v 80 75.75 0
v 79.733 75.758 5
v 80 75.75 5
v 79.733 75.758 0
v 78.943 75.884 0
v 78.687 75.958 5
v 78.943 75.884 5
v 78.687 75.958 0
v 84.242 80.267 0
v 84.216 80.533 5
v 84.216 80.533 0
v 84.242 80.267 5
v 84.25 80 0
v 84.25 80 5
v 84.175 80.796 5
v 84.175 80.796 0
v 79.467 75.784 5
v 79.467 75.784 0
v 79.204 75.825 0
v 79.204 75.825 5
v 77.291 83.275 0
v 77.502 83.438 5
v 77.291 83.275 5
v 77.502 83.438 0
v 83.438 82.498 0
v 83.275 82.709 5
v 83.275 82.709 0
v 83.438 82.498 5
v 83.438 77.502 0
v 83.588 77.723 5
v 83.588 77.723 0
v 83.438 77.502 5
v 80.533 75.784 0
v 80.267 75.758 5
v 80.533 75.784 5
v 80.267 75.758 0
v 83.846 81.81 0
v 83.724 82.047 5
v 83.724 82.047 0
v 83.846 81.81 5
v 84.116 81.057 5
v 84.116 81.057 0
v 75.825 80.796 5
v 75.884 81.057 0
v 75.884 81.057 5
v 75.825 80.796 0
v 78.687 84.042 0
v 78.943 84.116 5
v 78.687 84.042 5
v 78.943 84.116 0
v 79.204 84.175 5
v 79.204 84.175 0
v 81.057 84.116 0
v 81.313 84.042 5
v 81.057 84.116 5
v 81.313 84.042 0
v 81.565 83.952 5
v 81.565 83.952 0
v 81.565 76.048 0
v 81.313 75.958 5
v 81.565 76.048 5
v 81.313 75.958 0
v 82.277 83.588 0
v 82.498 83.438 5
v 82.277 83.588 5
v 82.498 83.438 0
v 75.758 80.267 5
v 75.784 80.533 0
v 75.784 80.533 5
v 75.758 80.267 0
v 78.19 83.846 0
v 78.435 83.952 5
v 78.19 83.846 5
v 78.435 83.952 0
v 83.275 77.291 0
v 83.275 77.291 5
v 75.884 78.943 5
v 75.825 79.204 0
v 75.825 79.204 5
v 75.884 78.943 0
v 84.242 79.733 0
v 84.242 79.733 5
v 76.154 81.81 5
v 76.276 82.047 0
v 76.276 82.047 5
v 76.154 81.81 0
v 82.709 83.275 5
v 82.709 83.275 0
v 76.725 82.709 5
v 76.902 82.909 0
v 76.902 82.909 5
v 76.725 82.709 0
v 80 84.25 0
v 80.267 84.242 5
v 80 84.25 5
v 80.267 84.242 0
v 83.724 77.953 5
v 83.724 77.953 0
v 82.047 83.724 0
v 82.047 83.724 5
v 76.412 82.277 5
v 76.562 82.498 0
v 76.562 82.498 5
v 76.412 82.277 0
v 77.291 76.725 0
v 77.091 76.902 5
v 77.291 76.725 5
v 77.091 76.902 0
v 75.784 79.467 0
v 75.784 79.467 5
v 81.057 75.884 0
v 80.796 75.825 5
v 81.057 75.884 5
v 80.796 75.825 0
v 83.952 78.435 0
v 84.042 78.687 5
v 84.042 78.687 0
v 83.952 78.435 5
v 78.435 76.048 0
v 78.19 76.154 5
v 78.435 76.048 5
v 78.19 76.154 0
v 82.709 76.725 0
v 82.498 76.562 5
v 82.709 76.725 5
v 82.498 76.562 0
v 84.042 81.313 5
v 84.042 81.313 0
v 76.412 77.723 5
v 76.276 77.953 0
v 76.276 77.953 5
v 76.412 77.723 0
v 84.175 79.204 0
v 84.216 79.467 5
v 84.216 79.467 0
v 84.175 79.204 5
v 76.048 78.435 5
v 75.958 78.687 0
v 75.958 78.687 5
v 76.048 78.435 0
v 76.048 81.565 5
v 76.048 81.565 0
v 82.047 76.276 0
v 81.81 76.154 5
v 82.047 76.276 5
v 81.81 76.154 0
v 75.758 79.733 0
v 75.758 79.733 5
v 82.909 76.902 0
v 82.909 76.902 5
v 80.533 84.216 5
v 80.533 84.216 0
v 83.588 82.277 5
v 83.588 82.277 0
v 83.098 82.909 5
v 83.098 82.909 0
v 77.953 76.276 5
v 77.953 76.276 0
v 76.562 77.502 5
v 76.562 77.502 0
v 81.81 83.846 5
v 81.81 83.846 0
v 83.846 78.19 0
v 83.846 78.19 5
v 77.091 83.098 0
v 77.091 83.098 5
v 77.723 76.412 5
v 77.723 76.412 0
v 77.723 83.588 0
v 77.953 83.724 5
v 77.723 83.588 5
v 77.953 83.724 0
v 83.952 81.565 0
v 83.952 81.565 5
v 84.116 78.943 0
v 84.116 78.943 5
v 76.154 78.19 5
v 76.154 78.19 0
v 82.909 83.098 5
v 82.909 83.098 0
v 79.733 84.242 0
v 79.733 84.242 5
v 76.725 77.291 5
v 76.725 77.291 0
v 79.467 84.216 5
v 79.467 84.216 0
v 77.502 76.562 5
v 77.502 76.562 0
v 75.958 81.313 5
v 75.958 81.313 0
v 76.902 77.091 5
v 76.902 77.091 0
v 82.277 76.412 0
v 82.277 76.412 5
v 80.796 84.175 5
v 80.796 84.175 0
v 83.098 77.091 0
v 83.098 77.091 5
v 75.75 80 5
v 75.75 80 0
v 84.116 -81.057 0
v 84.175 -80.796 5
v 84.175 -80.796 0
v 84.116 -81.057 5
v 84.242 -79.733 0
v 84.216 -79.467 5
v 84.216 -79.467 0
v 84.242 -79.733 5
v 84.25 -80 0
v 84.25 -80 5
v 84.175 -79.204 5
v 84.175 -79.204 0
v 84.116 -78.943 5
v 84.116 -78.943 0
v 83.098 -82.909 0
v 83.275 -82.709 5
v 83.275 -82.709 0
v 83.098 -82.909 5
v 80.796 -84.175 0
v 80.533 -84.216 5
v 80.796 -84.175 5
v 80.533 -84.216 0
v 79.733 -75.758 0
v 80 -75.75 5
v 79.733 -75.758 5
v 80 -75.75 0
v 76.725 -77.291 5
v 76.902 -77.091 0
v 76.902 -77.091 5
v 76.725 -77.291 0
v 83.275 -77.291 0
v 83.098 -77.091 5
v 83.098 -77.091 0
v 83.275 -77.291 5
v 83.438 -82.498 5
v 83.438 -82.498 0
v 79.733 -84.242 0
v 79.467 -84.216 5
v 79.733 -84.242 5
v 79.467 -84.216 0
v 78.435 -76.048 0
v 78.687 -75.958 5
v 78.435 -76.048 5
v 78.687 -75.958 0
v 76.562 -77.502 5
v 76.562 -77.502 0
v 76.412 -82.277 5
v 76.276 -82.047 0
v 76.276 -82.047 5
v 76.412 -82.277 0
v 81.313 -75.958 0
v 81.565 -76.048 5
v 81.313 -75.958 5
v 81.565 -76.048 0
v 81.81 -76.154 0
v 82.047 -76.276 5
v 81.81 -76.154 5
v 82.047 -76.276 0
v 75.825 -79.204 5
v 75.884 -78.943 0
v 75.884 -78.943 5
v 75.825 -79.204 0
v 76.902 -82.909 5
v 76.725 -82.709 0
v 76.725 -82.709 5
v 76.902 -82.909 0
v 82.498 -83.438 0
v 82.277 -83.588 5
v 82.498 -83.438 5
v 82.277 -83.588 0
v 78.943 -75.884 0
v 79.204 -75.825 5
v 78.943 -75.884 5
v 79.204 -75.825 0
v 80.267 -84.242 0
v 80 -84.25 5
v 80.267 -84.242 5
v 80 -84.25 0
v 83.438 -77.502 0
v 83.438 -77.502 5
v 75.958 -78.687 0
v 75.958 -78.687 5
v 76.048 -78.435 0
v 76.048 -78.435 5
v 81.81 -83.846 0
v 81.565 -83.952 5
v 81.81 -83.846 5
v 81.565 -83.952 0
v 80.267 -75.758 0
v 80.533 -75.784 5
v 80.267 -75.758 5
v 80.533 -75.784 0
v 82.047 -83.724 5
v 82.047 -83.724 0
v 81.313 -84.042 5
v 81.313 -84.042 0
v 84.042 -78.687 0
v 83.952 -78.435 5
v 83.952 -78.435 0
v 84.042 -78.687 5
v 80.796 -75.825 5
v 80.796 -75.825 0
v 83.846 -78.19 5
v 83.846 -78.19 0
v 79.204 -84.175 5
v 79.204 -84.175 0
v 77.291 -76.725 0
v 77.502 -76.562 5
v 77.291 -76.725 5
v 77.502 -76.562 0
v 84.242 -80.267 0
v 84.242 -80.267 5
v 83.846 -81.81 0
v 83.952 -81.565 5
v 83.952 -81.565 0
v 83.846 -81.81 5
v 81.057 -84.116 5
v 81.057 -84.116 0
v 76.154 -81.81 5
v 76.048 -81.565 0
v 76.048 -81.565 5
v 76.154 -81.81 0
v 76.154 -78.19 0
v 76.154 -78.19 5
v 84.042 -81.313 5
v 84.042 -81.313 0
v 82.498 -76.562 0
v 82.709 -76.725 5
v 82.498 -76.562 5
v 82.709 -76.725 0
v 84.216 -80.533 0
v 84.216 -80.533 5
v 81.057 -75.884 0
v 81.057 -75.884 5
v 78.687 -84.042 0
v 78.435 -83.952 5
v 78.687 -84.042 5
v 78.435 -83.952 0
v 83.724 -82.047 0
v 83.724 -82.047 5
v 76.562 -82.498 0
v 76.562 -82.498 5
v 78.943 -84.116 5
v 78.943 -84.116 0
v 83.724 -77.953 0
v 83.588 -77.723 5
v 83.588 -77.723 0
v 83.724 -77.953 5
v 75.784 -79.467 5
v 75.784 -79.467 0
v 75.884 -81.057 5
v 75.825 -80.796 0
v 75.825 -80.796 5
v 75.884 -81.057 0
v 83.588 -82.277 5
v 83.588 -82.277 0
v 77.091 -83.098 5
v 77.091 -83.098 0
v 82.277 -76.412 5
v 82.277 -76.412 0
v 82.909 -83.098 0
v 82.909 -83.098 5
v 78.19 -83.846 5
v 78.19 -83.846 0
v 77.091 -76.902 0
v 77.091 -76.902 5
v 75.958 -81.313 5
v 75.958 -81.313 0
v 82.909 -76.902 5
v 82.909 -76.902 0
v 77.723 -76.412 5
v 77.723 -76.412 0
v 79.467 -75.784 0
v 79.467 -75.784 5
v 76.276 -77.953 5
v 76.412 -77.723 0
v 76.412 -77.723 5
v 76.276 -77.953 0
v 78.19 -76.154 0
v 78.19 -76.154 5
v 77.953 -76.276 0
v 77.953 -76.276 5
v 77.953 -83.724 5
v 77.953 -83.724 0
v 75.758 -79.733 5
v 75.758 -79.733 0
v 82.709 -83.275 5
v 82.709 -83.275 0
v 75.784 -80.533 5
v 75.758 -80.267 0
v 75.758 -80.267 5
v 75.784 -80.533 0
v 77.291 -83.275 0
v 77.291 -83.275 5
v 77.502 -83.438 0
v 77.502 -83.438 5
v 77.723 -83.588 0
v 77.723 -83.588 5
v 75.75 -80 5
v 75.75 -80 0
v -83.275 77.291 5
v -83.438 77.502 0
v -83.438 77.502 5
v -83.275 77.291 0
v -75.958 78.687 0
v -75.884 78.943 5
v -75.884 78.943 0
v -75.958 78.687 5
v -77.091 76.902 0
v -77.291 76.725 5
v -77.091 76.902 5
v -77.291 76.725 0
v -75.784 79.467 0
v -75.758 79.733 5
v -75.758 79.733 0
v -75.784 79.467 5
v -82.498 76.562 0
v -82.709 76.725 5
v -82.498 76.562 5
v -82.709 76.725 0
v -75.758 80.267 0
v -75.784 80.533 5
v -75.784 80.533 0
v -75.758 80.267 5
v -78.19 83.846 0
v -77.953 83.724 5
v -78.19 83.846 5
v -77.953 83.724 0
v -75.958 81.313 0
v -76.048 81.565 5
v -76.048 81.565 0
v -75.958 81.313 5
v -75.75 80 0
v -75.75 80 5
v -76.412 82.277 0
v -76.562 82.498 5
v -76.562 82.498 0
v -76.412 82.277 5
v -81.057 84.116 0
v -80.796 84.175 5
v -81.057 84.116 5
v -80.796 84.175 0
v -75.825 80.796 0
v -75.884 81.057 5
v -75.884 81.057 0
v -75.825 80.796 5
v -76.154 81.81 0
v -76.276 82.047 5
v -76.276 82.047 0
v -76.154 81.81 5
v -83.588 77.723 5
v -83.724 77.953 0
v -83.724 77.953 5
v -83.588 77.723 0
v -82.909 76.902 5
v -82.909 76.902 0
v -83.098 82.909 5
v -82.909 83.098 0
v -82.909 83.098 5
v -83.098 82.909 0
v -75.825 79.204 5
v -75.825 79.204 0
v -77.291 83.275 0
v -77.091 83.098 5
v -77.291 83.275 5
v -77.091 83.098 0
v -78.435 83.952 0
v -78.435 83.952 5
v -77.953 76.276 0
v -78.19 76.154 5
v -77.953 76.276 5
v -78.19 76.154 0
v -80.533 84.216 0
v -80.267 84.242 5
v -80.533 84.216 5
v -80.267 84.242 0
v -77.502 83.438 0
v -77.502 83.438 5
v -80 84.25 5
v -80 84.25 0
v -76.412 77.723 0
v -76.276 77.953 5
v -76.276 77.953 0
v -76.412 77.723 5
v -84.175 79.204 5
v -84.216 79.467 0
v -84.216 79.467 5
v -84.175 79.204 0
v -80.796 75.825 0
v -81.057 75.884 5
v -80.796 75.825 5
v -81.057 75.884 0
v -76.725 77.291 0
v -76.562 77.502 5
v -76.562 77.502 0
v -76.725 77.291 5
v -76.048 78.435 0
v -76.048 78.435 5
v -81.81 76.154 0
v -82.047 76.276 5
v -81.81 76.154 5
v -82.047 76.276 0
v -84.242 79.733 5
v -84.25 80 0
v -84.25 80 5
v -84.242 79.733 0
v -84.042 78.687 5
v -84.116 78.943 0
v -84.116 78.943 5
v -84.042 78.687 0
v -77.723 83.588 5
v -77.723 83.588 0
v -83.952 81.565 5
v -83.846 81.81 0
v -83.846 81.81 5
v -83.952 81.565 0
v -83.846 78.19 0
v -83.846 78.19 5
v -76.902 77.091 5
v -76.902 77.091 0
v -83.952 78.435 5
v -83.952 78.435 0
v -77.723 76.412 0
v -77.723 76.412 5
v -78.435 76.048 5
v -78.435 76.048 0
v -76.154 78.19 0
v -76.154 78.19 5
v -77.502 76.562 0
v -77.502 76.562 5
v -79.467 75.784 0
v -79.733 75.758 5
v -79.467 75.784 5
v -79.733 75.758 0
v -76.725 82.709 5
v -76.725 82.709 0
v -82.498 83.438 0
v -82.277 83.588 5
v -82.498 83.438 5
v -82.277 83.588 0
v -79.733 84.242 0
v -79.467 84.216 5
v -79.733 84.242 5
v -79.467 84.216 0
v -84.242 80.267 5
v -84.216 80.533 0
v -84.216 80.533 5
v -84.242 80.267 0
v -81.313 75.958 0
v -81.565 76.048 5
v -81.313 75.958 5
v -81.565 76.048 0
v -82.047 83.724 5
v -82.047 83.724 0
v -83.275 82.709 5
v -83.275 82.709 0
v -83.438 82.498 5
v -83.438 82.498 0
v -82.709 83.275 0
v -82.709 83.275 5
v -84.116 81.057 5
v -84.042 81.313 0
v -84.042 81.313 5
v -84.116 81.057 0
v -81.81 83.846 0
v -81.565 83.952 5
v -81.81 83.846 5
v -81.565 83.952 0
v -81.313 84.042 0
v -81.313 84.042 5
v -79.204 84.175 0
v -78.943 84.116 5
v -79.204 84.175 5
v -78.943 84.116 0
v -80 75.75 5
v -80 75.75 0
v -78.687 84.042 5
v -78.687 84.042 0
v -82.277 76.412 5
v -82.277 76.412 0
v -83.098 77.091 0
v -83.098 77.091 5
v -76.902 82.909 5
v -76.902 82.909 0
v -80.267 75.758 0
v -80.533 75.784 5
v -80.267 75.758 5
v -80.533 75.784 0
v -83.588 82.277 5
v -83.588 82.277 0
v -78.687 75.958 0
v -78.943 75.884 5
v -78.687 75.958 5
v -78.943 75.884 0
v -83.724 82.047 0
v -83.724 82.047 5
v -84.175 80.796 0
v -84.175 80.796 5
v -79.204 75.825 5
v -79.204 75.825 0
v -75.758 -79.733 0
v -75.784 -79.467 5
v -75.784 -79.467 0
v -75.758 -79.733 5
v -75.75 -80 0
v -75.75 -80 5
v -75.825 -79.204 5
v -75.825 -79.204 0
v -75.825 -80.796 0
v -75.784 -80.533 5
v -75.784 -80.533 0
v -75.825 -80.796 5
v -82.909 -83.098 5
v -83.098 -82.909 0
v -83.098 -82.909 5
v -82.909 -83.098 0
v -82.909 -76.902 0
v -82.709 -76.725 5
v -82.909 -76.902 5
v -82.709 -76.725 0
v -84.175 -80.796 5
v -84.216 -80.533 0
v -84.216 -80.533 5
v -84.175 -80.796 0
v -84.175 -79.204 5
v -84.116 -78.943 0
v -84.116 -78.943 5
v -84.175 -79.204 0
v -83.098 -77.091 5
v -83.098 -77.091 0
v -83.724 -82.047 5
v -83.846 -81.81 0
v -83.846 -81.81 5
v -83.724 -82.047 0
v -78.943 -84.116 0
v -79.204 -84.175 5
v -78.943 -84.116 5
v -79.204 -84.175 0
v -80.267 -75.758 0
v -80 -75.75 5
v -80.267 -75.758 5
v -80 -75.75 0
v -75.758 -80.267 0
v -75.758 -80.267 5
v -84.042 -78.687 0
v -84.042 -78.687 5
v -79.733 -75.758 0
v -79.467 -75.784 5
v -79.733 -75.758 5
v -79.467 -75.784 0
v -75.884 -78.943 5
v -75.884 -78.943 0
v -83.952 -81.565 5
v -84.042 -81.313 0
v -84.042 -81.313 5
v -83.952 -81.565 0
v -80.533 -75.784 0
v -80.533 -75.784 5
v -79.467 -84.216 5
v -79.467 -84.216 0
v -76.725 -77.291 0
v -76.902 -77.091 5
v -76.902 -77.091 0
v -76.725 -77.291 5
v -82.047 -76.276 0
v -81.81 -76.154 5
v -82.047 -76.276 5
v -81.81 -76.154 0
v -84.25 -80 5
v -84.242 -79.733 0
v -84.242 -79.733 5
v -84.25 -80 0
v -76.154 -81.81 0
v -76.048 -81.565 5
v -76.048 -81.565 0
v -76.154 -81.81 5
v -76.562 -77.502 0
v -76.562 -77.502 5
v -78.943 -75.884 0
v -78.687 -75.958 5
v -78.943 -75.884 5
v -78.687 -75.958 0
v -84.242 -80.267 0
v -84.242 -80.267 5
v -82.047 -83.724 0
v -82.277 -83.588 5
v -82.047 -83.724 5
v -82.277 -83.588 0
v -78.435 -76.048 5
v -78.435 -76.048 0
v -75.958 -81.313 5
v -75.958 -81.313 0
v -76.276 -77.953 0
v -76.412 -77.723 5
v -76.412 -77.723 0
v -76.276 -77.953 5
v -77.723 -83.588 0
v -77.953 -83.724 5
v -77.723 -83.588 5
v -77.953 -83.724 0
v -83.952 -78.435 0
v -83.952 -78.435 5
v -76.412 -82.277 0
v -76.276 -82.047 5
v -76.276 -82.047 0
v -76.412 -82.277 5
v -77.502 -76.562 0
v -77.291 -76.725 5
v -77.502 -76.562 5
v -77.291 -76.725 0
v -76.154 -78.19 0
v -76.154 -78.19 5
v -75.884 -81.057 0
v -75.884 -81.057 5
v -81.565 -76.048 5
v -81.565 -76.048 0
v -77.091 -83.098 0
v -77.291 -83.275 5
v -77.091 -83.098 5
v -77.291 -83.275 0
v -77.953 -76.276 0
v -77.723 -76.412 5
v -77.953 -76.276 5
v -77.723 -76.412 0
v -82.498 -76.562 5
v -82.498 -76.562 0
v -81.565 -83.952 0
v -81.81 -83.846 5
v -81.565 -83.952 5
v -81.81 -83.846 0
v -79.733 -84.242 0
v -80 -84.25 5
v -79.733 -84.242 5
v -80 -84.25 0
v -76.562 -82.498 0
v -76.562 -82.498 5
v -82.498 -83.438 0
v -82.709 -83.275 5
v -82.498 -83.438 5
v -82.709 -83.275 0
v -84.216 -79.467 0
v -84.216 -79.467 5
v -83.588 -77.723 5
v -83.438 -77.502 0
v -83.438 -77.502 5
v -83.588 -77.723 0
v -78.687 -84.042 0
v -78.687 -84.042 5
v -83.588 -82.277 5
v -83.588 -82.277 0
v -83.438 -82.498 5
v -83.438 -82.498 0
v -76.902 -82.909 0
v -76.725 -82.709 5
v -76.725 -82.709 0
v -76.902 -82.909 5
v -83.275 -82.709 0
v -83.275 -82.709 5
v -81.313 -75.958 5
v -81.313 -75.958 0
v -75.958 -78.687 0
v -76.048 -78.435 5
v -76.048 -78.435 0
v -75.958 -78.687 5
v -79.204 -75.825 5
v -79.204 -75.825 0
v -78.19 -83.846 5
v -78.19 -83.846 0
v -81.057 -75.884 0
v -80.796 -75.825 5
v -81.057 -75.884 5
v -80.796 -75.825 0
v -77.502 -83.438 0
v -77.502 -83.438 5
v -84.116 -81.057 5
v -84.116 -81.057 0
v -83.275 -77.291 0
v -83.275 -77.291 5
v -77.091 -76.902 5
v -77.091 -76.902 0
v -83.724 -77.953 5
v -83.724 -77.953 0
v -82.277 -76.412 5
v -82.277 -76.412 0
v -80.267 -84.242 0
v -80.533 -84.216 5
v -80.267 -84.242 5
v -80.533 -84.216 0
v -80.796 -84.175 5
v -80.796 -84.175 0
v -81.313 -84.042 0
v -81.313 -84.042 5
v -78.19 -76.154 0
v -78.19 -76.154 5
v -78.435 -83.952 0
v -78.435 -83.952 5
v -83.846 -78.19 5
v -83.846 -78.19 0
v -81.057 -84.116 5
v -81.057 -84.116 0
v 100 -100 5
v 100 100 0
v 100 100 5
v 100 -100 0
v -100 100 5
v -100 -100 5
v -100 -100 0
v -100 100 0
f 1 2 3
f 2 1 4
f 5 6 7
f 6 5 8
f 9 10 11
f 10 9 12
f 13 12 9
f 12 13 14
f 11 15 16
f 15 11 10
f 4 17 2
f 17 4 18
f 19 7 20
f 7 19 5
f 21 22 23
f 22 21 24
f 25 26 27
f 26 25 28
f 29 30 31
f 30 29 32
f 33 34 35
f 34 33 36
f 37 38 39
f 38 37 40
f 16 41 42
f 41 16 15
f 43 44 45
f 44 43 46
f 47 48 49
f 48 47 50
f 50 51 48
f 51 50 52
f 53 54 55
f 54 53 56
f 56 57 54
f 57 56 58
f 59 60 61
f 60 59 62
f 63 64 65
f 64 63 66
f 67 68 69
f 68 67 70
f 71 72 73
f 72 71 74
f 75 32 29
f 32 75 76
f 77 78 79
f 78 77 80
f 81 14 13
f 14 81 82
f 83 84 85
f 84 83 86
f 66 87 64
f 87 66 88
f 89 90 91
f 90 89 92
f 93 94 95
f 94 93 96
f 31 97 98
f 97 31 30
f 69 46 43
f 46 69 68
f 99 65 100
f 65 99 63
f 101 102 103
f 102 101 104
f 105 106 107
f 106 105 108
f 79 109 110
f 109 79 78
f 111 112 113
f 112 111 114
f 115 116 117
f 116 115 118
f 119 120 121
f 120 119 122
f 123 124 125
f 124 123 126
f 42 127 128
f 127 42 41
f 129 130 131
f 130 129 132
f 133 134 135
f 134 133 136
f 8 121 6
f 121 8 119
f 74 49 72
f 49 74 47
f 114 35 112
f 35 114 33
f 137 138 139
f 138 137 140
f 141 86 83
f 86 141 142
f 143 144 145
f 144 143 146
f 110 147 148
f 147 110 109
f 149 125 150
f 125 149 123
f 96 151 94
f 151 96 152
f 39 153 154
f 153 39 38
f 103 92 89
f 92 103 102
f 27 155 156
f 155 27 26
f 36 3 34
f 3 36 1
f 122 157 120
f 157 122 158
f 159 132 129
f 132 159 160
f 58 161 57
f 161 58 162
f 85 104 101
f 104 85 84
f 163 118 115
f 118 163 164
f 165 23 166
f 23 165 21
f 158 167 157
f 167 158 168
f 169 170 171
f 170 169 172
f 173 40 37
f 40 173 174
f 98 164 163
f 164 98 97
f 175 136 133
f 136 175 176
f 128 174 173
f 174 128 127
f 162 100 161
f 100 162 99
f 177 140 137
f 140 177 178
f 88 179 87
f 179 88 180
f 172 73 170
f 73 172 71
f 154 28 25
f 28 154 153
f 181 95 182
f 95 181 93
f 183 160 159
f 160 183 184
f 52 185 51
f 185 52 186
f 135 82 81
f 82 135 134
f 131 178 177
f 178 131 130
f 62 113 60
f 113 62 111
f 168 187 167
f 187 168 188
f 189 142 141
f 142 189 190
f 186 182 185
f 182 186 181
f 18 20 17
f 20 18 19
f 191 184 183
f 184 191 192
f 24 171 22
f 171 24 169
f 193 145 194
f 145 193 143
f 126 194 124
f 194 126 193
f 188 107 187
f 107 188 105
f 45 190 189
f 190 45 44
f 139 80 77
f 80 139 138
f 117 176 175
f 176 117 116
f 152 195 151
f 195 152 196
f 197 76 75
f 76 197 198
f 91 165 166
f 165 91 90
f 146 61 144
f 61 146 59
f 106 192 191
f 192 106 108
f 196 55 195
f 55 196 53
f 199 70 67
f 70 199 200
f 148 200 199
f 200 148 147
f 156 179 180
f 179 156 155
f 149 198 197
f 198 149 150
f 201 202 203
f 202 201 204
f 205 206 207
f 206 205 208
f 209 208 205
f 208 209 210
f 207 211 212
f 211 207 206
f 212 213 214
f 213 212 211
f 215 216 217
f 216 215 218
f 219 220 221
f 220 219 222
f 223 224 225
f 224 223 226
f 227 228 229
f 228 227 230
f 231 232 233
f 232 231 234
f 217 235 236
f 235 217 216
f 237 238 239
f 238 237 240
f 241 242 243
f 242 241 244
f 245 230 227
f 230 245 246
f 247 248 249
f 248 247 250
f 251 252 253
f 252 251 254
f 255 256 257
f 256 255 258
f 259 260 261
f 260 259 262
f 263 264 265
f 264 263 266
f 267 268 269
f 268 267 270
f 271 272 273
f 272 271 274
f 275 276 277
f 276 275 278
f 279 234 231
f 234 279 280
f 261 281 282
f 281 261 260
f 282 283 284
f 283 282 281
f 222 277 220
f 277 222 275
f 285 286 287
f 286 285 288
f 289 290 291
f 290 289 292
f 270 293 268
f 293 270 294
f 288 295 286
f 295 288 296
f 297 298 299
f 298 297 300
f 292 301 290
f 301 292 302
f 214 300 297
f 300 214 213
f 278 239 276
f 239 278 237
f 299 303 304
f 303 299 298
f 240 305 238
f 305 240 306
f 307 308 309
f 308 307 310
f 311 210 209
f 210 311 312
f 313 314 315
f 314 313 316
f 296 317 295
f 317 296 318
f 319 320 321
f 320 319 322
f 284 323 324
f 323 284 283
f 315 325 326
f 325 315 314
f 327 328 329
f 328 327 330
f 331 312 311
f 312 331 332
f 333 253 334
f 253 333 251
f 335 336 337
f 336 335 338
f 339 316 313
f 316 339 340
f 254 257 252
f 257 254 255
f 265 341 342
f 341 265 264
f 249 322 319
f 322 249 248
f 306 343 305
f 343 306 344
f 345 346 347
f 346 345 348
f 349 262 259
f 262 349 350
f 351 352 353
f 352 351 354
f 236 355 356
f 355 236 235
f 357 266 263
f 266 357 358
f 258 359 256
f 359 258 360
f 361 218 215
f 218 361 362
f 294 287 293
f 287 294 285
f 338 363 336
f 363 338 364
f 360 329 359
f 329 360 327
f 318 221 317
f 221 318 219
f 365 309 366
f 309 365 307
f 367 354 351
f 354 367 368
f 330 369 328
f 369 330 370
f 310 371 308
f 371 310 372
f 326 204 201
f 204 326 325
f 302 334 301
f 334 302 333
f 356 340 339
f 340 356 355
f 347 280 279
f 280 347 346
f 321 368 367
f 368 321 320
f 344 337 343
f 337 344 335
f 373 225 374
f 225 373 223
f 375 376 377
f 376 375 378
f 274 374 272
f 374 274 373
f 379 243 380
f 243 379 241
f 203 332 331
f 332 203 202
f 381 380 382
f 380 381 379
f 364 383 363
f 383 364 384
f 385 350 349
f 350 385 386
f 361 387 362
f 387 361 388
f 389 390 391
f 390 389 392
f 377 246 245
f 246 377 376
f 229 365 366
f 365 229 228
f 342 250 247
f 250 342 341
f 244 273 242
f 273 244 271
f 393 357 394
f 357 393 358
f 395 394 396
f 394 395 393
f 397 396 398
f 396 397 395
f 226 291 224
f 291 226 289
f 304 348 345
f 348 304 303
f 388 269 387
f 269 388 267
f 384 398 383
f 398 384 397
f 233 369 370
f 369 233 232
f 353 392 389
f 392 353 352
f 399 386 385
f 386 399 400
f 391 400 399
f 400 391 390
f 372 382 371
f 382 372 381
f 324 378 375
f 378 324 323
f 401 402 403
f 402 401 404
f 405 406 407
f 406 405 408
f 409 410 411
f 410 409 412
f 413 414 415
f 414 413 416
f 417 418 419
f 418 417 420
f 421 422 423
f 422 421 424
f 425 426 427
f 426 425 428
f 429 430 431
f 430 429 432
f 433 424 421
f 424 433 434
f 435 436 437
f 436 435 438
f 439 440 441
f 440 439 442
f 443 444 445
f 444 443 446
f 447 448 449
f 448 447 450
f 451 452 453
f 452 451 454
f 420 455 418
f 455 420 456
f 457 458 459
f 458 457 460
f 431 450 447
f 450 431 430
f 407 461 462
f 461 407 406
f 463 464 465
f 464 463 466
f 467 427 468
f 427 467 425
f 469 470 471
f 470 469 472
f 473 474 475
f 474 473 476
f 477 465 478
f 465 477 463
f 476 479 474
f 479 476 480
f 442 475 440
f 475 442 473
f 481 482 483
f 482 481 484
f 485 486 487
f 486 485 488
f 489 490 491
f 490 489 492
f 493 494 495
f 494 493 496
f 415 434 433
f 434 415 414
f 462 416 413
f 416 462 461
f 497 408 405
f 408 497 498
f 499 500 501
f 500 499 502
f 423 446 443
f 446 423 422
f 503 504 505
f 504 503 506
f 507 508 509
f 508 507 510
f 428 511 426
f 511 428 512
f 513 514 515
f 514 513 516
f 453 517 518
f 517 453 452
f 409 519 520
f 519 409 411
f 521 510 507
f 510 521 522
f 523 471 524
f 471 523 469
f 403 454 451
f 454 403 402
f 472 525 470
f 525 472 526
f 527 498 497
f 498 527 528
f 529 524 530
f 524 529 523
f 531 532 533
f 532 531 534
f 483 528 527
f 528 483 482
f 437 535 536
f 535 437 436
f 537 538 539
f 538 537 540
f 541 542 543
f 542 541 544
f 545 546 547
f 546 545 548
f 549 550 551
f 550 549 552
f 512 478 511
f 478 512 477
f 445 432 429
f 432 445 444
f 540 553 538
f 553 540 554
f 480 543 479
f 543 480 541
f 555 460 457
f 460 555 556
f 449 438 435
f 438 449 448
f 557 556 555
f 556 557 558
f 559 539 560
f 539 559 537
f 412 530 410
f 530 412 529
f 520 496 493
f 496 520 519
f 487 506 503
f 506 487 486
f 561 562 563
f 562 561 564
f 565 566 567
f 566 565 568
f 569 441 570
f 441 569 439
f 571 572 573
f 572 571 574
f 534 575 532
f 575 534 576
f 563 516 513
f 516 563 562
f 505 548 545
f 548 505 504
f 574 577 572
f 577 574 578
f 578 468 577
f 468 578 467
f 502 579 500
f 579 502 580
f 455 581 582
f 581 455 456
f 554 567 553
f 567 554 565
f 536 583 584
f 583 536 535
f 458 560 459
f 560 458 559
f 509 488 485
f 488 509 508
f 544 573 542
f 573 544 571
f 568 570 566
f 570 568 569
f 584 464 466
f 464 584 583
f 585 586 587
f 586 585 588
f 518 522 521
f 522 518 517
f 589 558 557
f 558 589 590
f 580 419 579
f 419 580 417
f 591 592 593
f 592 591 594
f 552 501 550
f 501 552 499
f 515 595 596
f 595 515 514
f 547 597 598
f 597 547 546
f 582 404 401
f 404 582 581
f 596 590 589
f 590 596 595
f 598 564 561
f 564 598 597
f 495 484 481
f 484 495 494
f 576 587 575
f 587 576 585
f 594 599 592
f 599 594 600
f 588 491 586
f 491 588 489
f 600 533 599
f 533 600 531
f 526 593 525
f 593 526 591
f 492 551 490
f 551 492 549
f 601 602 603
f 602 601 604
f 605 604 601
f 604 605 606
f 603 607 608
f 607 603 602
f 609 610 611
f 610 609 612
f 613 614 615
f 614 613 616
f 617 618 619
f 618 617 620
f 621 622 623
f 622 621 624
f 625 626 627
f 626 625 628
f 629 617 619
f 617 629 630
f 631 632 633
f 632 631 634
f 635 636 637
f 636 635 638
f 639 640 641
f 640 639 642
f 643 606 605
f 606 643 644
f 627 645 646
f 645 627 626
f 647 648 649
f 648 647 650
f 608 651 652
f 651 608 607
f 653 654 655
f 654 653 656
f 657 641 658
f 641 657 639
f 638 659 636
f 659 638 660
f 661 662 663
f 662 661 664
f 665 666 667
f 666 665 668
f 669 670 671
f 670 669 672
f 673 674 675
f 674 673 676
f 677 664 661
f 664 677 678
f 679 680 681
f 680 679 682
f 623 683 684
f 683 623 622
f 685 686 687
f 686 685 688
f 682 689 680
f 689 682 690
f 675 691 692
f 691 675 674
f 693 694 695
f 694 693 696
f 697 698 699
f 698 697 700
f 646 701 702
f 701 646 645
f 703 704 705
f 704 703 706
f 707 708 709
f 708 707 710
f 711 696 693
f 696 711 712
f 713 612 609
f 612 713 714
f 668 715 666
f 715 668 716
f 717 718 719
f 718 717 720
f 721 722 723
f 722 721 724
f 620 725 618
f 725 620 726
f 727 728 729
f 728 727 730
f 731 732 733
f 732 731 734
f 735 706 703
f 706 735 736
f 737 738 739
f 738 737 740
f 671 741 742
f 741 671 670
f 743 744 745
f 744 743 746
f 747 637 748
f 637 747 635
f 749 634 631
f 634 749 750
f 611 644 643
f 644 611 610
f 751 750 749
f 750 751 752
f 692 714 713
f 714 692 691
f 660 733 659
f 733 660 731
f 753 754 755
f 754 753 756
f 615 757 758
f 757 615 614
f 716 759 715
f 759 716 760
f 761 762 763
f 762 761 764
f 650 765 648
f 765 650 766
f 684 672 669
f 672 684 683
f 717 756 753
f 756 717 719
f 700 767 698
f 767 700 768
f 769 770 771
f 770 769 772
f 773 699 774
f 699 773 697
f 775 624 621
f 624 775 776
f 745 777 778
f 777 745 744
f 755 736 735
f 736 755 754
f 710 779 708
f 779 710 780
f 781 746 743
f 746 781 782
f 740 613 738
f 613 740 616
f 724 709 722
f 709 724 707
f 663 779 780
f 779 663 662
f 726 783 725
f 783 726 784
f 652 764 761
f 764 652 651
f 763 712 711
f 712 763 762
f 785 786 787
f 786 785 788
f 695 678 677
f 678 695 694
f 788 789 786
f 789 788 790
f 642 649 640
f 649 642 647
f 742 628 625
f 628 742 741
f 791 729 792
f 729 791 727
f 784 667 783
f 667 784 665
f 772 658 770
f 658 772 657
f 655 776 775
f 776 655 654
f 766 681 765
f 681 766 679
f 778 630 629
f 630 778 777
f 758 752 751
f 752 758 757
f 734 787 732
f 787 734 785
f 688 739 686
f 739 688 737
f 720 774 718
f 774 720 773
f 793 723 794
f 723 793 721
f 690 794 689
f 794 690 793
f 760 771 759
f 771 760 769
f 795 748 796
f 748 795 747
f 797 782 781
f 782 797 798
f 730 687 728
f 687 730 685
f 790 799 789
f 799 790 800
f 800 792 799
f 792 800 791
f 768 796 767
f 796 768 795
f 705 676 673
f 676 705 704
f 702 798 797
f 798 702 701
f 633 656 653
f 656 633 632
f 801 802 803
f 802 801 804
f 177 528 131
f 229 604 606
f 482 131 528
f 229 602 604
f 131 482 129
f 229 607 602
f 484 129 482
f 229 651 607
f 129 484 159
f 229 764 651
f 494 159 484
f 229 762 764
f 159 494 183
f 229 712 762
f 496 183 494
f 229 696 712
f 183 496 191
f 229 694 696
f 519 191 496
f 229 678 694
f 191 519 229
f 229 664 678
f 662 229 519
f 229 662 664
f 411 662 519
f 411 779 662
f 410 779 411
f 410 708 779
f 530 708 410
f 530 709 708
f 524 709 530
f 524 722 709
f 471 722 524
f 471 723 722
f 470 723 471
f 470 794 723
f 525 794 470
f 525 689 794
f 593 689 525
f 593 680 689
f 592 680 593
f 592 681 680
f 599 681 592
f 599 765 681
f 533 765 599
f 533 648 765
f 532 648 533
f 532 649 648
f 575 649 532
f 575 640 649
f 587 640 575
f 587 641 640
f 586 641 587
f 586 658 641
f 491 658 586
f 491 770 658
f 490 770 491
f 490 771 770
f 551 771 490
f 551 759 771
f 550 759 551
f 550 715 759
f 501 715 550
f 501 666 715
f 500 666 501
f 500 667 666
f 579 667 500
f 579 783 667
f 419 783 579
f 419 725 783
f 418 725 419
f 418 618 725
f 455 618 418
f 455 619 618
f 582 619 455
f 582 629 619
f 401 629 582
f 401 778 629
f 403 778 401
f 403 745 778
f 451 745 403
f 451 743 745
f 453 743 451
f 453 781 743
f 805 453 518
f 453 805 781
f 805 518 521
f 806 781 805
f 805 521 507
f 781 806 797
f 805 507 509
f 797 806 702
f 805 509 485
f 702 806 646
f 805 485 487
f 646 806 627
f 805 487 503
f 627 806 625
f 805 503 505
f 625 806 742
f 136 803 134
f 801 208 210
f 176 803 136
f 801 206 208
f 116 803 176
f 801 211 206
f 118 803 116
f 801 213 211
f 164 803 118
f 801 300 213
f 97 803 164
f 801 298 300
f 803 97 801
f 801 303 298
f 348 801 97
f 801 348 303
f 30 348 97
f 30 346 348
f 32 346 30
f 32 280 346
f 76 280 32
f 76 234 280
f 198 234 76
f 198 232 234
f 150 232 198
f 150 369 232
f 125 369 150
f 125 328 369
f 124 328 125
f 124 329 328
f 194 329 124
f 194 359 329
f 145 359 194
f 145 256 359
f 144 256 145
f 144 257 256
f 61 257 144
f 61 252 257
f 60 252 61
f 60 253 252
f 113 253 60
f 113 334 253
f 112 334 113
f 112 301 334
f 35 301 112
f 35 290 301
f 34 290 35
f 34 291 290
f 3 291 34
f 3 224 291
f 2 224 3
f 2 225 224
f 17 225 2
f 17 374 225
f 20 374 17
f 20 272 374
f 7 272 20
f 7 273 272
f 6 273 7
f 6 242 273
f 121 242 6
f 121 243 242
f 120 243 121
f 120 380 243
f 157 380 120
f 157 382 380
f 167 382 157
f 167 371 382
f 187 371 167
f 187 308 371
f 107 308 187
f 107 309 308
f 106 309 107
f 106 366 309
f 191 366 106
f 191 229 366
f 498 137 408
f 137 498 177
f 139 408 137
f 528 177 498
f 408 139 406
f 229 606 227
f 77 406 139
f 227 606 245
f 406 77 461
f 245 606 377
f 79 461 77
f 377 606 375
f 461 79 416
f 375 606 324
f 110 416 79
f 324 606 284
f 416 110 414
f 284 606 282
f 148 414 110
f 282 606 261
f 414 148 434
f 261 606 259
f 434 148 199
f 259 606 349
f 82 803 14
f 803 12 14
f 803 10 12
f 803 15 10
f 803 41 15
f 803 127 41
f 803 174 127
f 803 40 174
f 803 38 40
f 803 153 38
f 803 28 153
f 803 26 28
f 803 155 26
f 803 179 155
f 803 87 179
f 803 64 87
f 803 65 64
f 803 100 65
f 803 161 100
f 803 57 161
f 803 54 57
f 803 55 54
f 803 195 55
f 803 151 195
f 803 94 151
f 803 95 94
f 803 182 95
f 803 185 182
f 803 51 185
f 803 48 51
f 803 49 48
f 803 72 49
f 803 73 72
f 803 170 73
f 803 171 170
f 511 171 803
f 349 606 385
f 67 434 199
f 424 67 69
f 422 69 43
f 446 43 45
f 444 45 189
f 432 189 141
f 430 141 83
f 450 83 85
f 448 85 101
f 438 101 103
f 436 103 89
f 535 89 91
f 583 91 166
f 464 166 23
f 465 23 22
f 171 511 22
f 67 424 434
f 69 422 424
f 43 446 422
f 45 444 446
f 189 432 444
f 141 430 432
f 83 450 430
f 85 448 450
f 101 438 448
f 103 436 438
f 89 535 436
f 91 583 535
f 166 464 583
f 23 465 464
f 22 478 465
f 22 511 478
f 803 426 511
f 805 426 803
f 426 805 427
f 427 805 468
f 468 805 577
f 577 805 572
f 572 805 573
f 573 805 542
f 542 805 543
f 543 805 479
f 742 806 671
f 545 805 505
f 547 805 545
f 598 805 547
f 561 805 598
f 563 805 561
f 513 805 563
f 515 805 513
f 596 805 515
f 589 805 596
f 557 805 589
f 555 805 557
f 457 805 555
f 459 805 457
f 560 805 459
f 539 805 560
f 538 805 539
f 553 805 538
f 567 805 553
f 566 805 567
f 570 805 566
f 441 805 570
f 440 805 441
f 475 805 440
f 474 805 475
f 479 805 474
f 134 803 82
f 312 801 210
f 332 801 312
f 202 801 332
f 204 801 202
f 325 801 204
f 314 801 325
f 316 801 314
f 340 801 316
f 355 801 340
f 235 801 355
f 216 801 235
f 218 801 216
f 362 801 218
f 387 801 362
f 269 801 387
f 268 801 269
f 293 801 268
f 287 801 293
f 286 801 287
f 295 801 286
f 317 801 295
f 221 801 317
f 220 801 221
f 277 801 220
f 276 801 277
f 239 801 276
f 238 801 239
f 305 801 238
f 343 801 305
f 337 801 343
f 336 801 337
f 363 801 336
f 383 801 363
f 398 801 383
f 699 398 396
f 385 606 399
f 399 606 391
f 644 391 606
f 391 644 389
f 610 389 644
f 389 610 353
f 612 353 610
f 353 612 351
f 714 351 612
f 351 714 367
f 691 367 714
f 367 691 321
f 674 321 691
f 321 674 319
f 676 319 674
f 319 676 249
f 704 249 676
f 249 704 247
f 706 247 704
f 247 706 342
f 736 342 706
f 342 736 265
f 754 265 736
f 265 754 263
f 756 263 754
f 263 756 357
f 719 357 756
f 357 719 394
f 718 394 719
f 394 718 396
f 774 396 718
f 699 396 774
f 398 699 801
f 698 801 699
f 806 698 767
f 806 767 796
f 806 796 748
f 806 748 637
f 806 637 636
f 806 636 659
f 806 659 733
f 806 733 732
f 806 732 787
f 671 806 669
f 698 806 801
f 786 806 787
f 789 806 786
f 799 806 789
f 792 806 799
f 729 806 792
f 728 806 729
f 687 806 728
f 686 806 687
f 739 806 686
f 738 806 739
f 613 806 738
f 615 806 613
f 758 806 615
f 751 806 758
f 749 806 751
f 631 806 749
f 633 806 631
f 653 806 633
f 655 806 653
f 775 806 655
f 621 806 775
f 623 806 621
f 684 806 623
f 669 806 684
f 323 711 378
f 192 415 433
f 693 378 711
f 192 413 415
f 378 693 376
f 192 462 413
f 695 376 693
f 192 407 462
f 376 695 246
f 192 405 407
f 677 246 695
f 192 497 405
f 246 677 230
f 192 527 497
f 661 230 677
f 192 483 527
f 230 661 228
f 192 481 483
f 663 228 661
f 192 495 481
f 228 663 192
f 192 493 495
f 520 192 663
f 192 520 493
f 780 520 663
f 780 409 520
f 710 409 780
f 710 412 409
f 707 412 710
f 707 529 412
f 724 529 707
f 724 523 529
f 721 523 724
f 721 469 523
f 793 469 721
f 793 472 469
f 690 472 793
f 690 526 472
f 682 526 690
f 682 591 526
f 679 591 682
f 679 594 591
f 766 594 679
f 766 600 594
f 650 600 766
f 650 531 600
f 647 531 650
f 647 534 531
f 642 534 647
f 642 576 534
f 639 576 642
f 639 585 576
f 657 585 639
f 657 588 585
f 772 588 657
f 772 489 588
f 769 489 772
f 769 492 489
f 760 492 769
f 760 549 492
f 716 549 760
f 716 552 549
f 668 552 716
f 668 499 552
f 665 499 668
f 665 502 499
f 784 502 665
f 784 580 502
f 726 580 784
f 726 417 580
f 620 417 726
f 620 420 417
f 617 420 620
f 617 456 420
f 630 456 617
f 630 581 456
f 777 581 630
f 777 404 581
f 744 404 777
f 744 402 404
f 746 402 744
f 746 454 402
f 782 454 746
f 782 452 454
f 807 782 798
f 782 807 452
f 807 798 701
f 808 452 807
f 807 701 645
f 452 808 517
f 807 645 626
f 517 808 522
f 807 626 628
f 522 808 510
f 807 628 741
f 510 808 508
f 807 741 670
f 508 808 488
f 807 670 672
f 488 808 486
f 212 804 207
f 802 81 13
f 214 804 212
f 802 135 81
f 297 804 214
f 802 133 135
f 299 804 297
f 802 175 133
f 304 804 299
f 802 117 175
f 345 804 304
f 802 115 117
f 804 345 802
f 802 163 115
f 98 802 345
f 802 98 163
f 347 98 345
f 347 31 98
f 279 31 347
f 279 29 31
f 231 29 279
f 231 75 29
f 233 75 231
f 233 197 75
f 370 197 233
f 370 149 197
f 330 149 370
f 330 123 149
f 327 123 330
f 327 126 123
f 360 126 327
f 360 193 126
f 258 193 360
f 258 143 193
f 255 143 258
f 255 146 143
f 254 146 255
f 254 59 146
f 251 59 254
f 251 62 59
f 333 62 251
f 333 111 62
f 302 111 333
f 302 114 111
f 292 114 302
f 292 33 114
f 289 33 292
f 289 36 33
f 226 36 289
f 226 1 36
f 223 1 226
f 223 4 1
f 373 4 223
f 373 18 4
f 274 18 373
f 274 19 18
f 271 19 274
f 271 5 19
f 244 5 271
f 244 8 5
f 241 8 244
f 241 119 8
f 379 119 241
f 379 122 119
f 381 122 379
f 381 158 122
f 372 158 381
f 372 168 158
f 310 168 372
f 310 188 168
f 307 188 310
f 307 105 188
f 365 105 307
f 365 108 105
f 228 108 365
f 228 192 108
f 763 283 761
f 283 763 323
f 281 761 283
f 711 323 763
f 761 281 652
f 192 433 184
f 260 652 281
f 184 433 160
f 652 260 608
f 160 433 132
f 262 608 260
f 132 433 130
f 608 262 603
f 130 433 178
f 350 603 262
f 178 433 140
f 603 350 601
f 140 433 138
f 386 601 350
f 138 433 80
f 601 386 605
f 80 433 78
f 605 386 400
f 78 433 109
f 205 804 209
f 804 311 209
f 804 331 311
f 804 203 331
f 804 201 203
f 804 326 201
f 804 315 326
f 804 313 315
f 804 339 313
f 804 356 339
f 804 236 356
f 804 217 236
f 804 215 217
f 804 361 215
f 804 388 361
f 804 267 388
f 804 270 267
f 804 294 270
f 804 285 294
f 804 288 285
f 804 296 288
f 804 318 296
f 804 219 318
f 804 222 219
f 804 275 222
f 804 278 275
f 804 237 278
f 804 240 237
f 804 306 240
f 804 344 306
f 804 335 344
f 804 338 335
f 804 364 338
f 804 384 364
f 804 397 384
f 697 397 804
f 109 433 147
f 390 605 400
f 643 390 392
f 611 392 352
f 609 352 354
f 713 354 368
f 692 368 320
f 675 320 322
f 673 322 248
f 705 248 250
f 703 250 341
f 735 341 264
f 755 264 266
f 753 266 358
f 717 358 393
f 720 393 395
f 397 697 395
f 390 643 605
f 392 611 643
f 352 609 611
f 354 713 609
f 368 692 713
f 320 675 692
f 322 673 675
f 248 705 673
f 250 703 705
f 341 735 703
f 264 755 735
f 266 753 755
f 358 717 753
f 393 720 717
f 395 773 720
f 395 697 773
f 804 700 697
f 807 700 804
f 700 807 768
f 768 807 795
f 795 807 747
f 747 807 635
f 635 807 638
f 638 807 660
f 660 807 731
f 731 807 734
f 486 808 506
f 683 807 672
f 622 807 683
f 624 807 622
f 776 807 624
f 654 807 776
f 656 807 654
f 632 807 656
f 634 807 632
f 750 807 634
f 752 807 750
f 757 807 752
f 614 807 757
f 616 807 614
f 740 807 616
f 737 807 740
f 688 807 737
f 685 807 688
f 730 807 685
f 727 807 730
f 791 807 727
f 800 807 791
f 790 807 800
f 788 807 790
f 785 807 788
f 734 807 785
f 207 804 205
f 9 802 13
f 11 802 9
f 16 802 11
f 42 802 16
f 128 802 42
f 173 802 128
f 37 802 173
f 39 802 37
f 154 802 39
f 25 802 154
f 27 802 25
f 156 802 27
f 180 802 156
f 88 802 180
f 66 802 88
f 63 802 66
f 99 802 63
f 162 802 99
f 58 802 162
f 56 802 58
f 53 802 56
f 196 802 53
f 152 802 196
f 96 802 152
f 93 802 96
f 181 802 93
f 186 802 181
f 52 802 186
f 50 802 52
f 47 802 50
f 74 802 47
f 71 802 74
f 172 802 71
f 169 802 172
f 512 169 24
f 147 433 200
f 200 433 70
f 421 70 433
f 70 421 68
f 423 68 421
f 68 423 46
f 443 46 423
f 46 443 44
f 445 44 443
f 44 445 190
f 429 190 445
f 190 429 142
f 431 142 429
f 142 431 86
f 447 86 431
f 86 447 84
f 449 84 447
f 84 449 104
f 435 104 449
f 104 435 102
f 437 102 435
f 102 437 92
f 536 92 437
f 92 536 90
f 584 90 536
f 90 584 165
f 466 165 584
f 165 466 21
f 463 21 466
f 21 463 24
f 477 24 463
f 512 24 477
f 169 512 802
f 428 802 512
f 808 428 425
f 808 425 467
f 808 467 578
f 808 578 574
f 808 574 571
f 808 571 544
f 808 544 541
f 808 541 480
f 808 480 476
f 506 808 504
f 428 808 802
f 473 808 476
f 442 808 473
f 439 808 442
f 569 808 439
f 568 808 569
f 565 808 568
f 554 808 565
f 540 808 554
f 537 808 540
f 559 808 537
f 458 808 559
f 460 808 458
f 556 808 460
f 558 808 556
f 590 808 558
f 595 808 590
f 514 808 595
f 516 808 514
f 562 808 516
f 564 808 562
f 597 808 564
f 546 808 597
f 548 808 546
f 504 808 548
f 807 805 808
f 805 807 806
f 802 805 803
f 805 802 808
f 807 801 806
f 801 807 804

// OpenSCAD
$fn = 100;

module plate() {
	translate([0, 0, (5 / 2)]) {
		cube([200, 200, 5], center = true);
	}
}

module screw_holes() {
	union() {
		translate([80, 80, -0.1]) {
			cylinder(h = 5.2, r1 = (8.5) / 2, r2 = (8.5 / 2));
		}
		
		translate([80, -80, -0.1]) {
			cylinder(h = 5.2, r1 = (8.5) / 2, r2 = (8.5 / 2));
		}
		
		translate([-80, 80, -0.1]) {
			cylinder(h = 5.2, r1 = (8.5) / 2, r2 = (8.5 / 2));
		}
		
		translate([-80, -80, -0.1]) {
			cylinder(h = 5.2, r1 = (8.5) / 2, r2 = (8.5 / 2));
		}
	}
}

module base_plate() {
	union() {
		difference() {
			plate();

			screw_holes();
		}
	}
}

base_plate();
